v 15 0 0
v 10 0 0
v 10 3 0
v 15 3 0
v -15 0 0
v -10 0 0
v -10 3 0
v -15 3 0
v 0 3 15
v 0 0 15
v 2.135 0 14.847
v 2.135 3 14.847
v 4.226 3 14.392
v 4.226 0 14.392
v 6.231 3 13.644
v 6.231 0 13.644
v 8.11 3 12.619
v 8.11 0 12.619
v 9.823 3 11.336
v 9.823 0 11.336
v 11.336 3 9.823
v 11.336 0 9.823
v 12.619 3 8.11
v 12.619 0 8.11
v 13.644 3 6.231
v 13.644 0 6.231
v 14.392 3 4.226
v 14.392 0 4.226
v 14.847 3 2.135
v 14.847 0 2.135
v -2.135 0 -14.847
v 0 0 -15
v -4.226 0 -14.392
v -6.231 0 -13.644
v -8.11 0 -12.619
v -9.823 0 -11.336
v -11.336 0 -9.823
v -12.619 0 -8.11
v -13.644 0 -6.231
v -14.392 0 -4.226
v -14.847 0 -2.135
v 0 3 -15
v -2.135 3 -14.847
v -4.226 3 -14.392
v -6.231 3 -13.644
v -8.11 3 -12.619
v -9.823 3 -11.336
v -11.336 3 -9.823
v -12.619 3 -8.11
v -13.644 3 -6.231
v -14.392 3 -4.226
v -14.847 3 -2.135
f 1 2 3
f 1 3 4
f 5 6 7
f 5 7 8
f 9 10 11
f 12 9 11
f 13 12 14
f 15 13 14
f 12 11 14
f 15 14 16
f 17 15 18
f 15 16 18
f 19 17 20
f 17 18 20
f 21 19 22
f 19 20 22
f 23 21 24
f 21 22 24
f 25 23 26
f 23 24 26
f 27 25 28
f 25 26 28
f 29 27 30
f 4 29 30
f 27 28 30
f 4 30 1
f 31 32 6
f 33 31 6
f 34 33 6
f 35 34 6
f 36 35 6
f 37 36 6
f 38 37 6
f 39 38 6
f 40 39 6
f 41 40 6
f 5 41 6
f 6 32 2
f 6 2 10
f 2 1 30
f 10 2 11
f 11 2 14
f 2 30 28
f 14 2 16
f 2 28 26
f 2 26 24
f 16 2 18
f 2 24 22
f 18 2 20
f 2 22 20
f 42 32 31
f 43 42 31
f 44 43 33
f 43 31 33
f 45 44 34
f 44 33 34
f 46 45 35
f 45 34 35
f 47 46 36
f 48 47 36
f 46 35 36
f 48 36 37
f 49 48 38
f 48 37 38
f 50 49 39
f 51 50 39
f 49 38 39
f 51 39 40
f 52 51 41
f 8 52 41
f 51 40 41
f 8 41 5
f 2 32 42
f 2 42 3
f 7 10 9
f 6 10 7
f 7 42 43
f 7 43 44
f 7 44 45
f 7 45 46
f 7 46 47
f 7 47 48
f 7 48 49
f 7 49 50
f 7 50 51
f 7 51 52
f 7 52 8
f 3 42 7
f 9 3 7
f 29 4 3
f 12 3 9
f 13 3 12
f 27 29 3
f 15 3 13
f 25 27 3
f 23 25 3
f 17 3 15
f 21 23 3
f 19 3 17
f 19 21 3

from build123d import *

# Parameters (mm, degrees)
SKETCH1_R           = 15
BOSS_EXTRUDE1_DEPTH = 3
CUT_EXTRUDE2_START  = -8
CUT_EXTRUDE2_DEPTH  = 8


with BuildPart() as part:
    # Sketch1 → Boss-Extrude1 (new body)
    with BuildSketch(Plane(origin=(0, 0, 0), x_dir=(1, 0, 0), z_dir=(0, 1, 0))):
        with Locations(Location((0, 0, 0), (0, 0, 270))):
            Circle(SKETCH1_R)
    extrude(amount=BOSS_EXTRUDE1_DEPTH)

    # Sketch3 → Cut-Extrude2 (cut)
    with BuildSketch(Plane(origin=(0, 3, 0), x_dir=(1, 0, 0), z_dir=(0, 1, 0)).offset(CUT_EXTRUDE2_START)):
        with BuildLine():
            Line((0, -15), (-10, 0))
            Line((-10, 0), (-15, 0))
            ThreePointArc((-15, 0), (-10.606601718, -10.606601718), (0, -15))
        make_face()
        with BuildLine():
            Line((0, 15), (10, 0))
            Line((10, 0), (15, 0))
            ThreePointArc((15, 0), (10.606601718, 10.606601718), (0, 15))
        make_face()
    extrude(amount=CUT_EXTRUDE2_DEPTH, mode=Mode.SUBTRACT)


solid = part.part
